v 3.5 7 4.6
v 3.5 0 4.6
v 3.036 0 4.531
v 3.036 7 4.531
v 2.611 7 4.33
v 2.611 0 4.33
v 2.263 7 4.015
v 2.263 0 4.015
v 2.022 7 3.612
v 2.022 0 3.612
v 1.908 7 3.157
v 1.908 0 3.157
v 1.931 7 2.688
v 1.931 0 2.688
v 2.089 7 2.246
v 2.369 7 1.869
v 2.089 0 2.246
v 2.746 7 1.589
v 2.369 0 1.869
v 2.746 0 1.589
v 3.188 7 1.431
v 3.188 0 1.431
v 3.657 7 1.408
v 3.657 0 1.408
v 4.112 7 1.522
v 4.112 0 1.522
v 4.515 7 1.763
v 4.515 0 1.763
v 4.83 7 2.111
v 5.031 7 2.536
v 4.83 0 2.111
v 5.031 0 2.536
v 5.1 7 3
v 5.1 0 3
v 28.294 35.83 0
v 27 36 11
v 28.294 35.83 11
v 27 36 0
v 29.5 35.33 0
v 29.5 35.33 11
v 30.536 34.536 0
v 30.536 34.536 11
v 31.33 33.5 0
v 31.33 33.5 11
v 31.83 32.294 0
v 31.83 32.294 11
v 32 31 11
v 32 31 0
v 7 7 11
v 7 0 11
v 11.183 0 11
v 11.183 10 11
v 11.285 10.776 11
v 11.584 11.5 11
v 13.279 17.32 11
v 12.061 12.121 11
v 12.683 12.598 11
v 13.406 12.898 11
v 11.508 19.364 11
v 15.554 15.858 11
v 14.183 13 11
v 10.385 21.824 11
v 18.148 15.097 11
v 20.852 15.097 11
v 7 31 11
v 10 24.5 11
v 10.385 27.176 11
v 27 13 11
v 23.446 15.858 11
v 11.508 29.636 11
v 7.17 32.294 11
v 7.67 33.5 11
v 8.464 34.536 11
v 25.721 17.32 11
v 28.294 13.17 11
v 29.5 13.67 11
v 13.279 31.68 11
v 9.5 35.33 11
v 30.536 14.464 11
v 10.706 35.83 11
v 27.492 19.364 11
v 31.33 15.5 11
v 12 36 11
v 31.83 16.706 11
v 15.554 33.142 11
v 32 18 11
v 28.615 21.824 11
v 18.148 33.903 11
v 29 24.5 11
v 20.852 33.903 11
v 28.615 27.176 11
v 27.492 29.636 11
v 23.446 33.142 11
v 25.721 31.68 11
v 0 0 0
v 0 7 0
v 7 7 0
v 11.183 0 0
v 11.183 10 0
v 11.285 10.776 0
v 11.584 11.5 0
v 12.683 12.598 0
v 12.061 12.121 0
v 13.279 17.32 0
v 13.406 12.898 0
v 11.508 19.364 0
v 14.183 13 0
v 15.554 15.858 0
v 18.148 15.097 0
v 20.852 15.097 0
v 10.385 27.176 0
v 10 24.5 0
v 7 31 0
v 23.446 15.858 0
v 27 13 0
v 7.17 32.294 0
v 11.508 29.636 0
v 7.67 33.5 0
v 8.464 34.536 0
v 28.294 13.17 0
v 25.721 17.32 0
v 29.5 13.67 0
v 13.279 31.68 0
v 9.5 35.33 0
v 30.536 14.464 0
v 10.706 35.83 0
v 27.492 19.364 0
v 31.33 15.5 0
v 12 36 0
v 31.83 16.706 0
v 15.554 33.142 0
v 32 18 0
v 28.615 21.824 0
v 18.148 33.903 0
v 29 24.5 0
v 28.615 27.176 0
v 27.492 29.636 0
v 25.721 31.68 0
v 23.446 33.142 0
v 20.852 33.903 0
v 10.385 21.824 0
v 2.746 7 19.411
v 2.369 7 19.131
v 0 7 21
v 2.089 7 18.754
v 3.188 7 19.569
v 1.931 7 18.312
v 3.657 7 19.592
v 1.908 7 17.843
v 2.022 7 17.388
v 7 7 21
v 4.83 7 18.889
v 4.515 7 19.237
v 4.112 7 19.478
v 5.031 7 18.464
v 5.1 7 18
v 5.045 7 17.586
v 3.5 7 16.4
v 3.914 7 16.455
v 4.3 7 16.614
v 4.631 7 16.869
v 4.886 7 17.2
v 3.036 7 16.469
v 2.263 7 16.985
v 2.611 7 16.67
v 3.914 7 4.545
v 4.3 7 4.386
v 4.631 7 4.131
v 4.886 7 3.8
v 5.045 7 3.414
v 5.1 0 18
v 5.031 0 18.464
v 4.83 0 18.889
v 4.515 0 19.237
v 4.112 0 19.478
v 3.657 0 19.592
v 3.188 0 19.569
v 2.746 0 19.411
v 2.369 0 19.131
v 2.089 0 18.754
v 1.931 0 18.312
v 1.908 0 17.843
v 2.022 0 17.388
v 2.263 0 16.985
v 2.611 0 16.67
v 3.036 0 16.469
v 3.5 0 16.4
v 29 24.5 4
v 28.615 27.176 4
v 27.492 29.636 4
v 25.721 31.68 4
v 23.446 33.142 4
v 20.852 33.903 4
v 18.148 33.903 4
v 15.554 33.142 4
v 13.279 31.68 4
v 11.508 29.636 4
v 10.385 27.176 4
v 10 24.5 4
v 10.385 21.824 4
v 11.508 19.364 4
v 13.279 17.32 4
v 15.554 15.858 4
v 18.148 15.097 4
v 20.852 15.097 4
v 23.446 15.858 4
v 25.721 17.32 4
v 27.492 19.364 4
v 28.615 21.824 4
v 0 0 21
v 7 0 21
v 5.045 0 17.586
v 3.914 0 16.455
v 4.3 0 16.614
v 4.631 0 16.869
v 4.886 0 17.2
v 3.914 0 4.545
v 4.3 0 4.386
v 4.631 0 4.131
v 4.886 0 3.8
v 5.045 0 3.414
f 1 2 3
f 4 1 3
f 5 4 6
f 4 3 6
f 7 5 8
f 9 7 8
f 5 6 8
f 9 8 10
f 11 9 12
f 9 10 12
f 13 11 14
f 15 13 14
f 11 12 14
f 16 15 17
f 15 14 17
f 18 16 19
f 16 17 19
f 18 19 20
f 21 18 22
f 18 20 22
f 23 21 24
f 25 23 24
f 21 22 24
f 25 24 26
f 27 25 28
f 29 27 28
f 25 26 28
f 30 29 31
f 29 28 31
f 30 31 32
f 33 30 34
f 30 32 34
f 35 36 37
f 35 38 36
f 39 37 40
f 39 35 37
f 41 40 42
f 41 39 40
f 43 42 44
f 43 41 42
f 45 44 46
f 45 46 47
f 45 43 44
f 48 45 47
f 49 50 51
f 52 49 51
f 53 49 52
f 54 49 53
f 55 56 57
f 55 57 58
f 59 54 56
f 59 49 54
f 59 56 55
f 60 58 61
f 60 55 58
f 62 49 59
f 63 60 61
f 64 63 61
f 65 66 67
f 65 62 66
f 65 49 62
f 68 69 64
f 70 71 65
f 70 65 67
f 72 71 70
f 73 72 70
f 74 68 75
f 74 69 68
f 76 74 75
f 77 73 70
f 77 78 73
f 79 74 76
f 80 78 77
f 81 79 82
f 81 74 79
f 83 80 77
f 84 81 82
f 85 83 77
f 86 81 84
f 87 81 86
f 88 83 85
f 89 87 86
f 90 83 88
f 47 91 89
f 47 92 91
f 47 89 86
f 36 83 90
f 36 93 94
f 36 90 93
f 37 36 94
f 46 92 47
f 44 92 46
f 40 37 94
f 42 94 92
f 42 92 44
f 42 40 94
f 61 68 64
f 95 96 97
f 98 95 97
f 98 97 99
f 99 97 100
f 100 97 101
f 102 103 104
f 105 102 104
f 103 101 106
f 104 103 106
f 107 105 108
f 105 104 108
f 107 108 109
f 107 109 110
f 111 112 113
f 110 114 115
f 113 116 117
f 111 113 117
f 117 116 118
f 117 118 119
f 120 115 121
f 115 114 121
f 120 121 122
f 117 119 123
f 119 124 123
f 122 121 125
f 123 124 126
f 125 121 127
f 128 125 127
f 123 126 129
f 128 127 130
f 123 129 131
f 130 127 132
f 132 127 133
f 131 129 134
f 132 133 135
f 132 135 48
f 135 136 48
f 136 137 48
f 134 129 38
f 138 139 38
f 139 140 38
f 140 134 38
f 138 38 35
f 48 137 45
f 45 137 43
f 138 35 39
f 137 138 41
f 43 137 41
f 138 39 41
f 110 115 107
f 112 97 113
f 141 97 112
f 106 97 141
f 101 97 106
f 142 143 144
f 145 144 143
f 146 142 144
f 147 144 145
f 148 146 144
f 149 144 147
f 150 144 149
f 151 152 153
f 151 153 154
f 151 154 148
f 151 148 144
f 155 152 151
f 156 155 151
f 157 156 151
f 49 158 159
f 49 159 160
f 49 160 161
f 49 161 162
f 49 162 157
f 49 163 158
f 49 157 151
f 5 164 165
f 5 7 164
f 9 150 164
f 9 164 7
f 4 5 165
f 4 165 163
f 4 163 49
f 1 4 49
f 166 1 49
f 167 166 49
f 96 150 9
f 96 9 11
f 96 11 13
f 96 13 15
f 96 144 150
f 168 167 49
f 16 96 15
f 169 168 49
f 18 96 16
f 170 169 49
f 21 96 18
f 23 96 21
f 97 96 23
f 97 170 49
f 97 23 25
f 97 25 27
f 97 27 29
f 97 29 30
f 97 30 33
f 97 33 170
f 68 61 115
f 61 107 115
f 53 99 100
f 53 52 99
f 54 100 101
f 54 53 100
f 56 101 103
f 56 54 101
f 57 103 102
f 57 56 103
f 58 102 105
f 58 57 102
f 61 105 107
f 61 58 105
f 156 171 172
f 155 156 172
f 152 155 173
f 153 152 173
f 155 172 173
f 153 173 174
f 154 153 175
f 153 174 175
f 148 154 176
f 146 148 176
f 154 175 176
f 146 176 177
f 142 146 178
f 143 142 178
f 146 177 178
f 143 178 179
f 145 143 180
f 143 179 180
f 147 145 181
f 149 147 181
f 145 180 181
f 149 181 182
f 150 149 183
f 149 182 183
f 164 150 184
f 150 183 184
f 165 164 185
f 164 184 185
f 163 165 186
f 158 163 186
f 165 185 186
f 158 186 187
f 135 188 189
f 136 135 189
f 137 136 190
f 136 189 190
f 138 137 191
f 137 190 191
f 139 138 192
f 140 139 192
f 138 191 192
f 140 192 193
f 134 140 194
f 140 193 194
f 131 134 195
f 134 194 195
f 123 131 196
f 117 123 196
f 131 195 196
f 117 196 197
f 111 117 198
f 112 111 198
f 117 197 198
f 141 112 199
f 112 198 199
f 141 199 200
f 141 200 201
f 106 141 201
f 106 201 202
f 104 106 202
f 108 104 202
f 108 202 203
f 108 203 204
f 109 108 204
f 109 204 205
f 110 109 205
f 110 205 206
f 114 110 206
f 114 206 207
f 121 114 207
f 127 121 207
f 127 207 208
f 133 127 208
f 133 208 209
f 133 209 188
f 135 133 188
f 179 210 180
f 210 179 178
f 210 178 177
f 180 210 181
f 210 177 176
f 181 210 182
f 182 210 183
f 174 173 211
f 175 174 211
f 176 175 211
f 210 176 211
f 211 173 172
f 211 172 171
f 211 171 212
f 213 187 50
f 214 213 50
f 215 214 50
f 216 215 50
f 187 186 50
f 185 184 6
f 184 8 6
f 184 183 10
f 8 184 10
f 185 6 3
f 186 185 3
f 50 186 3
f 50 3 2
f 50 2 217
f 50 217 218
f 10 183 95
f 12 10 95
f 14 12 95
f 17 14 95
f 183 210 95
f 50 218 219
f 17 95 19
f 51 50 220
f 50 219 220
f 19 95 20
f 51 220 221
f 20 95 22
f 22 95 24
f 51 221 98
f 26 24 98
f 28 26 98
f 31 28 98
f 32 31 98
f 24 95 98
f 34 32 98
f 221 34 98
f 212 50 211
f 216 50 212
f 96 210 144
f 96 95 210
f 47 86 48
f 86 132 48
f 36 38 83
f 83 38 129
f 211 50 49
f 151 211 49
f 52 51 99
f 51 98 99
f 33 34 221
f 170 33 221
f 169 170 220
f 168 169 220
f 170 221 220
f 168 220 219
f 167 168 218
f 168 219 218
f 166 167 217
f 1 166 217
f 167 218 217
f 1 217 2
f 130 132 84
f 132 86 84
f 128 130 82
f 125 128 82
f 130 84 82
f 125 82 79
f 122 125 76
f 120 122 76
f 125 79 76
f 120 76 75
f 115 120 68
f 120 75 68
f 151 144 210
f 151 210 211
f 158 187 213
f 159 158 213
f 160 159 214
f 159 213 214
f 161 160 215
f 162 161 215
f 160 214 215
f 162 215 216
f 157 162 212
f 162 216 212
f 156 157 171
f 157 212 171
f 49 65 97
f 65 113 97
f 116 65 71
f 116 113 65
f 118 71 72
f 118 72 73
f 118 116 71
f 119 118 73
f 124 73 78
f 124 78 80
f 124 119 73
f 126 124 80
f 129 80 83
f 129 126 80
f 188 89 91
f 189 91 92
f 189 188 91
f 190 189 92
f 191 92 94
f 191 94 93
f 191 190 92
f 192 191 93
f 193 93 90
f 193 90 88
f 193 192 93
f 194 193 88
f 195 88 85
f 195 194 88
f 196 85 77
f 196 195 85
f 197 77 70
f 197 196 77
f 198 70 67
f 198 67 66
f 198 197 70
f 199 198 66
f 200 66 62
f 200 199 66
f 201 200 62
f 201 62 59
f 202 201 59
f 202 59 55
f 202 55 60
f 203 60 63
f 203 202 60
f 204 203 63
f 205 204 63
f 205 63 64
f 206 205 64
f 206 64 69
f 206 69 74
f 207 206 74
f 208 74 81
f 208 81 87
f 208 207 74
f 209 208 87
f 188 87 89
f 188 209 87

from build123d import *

# Parameters (mm, degrees)
F0_W     = 32
F0_H     = 36
F1_DEPTH = 4
F2_R     = 9.5
F2_W     = 7
F2_H     = 29
F2_W_2   = 20.817460835
F2_H_2   = 13
F3_DEPTH = 25
F4_W     = 7
F4_H     = 7
F4_R     = 9.5
F5_DEPTH = 7
F6_DEPTH = 17
F8_DEPTH = 25
F9_R     = 5
F10_R    = 3


# Not quite as in the source:
# - a feature of the source that left no trace in its solid (it failed there, or was rolled back) is left out


with BuildPart() as f1:
    # F0 (on Top) → F1 (new body)
    with BuildSketch(Plane.XY):
        with Locations((16, 18)):
            Rectangle(F0_W, F0_H)
    extrude(amount=F1_DEPTH)

    # F2 (on face) → F3 (cut)
    with BuildSketch(Plane.XY.offset(4)):
        with Locations((19.5, 24.5)):
            Circle(F2_R)
        with Locations((3.5, 21.5)):
            Rectangle(F2_W, F2_H)
        with Locations((21.5912695825, 6.5)):
            Rectangle(F2_W_2, F2_H_2)
    extrude(amount=-F3_DEPTH, mode=Mode.SUBTRACT)

    # F4 (on face) → F5 (join)
    with BuildSketch(Plane.XY.offset(4)):
        with Locations((3.5, 3.5)):
            Rectangle(F4_W, F4_H)
        Polygon((7, 36), (7, 7), (7, 0), (11.182539165, 0), (11.182539165, 13), (32, 13), (32, 36), align=None)
        with Locations((19.5, 24.5)):
            Circle(F4_R, mode=Mode.SUBTRACT)
    extrude(amount=F5_DEPTH)

    # F4 (on face) → F6 (join)
    with BuildSketch(Plane.XY.offset(4)):
        with Locations((3.5, 3.5)):
            Rectangle(F4_W, F4_H)
    extrude(amount=F6_DEPTH)

    # F7 (on face) → F8 (cut)
    with BuildSketch(Plane.XZ):
        with BuildLine():
            ThreePointArc((5.1, 3), (4.6313708499, 4.1313708499), (3.5, 4.6))
            ThreePointArc((3.5, 4.6), (2.3686291501, 1.8686291501), (5.1, 3))
        make_face()
        with BuildLine():
            ThreePointArc((5.1, 18), (2.3686291501, 19.1313708499), (3.5, 16.4))
            ThreePointArc((3.5, 16.4), (4.6313708499, 16.8686291501), (5.1, 18))
        make_face()
    extrude(amount=-F8_DEPTH, mode=Mode.SUBTRACT)

    # F9
    f9_edges = [f1.edges().sort_by_distance(p)[0] for p in [
        (32, 36, 5.5),
        (7, 36, 5.5),
        (32, 13, 5.5),
    ]]
    fillet(f9_edges, radius=F9_R)

    # F10
    f10_edges = [f1.edges().sort_by_distance(p)[0] for p in [
        (11.182539, 13, 5.5),
    ]]
    fillet(f10_edges, radius=F10_R)


solid = f1.part
